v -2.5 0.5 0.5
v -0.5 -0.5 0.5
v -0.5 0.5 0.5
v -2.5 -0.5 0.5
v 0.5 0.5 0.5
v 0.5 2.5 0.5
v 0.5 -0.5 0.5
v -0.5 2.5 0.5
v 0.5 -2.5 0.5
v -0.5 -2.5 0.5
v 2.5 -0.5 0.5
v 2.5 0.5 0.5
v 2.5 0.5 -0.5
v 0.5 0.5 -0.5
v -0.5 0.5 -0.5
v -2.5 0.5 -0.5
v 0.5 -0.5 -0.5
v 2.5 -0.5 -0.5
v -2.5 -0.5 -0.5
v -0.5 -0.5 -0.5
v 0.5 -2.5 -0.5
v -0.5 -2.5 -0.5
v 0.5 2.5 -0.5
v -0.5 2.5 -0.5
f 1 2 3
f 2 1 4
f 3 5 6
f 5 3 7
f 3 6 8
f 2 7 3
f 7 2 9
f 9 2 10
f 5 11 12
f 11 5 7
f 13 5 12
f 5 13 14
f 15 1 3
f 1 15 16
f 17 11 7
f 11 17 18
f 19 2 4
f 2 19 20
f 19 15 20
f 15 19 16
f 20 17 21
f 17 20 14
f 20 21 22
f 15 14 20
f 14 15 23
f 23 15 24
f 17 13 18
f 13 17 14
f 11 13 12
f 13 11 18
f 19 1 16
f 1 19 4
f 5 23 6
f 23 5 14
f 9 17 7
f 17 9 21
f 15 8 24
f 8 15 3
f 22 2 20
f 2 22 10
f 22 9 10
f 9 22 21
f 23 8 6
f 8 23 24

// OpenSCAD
// Volume: 9, SurfaceArea: 38
// Causes a CGAL assertion in CGALEvaluator::process()
e=0.000;
for (m = [ [ [ 0, 1, 0], [ 0, 0, 1], [ 1, 0, 0] ],
       [ [-1, 0, e], [ 0,-1, 0], [ 0, 0,-1] ] ] )
    multmatrix (m) cube([1,5,1], center=true);
